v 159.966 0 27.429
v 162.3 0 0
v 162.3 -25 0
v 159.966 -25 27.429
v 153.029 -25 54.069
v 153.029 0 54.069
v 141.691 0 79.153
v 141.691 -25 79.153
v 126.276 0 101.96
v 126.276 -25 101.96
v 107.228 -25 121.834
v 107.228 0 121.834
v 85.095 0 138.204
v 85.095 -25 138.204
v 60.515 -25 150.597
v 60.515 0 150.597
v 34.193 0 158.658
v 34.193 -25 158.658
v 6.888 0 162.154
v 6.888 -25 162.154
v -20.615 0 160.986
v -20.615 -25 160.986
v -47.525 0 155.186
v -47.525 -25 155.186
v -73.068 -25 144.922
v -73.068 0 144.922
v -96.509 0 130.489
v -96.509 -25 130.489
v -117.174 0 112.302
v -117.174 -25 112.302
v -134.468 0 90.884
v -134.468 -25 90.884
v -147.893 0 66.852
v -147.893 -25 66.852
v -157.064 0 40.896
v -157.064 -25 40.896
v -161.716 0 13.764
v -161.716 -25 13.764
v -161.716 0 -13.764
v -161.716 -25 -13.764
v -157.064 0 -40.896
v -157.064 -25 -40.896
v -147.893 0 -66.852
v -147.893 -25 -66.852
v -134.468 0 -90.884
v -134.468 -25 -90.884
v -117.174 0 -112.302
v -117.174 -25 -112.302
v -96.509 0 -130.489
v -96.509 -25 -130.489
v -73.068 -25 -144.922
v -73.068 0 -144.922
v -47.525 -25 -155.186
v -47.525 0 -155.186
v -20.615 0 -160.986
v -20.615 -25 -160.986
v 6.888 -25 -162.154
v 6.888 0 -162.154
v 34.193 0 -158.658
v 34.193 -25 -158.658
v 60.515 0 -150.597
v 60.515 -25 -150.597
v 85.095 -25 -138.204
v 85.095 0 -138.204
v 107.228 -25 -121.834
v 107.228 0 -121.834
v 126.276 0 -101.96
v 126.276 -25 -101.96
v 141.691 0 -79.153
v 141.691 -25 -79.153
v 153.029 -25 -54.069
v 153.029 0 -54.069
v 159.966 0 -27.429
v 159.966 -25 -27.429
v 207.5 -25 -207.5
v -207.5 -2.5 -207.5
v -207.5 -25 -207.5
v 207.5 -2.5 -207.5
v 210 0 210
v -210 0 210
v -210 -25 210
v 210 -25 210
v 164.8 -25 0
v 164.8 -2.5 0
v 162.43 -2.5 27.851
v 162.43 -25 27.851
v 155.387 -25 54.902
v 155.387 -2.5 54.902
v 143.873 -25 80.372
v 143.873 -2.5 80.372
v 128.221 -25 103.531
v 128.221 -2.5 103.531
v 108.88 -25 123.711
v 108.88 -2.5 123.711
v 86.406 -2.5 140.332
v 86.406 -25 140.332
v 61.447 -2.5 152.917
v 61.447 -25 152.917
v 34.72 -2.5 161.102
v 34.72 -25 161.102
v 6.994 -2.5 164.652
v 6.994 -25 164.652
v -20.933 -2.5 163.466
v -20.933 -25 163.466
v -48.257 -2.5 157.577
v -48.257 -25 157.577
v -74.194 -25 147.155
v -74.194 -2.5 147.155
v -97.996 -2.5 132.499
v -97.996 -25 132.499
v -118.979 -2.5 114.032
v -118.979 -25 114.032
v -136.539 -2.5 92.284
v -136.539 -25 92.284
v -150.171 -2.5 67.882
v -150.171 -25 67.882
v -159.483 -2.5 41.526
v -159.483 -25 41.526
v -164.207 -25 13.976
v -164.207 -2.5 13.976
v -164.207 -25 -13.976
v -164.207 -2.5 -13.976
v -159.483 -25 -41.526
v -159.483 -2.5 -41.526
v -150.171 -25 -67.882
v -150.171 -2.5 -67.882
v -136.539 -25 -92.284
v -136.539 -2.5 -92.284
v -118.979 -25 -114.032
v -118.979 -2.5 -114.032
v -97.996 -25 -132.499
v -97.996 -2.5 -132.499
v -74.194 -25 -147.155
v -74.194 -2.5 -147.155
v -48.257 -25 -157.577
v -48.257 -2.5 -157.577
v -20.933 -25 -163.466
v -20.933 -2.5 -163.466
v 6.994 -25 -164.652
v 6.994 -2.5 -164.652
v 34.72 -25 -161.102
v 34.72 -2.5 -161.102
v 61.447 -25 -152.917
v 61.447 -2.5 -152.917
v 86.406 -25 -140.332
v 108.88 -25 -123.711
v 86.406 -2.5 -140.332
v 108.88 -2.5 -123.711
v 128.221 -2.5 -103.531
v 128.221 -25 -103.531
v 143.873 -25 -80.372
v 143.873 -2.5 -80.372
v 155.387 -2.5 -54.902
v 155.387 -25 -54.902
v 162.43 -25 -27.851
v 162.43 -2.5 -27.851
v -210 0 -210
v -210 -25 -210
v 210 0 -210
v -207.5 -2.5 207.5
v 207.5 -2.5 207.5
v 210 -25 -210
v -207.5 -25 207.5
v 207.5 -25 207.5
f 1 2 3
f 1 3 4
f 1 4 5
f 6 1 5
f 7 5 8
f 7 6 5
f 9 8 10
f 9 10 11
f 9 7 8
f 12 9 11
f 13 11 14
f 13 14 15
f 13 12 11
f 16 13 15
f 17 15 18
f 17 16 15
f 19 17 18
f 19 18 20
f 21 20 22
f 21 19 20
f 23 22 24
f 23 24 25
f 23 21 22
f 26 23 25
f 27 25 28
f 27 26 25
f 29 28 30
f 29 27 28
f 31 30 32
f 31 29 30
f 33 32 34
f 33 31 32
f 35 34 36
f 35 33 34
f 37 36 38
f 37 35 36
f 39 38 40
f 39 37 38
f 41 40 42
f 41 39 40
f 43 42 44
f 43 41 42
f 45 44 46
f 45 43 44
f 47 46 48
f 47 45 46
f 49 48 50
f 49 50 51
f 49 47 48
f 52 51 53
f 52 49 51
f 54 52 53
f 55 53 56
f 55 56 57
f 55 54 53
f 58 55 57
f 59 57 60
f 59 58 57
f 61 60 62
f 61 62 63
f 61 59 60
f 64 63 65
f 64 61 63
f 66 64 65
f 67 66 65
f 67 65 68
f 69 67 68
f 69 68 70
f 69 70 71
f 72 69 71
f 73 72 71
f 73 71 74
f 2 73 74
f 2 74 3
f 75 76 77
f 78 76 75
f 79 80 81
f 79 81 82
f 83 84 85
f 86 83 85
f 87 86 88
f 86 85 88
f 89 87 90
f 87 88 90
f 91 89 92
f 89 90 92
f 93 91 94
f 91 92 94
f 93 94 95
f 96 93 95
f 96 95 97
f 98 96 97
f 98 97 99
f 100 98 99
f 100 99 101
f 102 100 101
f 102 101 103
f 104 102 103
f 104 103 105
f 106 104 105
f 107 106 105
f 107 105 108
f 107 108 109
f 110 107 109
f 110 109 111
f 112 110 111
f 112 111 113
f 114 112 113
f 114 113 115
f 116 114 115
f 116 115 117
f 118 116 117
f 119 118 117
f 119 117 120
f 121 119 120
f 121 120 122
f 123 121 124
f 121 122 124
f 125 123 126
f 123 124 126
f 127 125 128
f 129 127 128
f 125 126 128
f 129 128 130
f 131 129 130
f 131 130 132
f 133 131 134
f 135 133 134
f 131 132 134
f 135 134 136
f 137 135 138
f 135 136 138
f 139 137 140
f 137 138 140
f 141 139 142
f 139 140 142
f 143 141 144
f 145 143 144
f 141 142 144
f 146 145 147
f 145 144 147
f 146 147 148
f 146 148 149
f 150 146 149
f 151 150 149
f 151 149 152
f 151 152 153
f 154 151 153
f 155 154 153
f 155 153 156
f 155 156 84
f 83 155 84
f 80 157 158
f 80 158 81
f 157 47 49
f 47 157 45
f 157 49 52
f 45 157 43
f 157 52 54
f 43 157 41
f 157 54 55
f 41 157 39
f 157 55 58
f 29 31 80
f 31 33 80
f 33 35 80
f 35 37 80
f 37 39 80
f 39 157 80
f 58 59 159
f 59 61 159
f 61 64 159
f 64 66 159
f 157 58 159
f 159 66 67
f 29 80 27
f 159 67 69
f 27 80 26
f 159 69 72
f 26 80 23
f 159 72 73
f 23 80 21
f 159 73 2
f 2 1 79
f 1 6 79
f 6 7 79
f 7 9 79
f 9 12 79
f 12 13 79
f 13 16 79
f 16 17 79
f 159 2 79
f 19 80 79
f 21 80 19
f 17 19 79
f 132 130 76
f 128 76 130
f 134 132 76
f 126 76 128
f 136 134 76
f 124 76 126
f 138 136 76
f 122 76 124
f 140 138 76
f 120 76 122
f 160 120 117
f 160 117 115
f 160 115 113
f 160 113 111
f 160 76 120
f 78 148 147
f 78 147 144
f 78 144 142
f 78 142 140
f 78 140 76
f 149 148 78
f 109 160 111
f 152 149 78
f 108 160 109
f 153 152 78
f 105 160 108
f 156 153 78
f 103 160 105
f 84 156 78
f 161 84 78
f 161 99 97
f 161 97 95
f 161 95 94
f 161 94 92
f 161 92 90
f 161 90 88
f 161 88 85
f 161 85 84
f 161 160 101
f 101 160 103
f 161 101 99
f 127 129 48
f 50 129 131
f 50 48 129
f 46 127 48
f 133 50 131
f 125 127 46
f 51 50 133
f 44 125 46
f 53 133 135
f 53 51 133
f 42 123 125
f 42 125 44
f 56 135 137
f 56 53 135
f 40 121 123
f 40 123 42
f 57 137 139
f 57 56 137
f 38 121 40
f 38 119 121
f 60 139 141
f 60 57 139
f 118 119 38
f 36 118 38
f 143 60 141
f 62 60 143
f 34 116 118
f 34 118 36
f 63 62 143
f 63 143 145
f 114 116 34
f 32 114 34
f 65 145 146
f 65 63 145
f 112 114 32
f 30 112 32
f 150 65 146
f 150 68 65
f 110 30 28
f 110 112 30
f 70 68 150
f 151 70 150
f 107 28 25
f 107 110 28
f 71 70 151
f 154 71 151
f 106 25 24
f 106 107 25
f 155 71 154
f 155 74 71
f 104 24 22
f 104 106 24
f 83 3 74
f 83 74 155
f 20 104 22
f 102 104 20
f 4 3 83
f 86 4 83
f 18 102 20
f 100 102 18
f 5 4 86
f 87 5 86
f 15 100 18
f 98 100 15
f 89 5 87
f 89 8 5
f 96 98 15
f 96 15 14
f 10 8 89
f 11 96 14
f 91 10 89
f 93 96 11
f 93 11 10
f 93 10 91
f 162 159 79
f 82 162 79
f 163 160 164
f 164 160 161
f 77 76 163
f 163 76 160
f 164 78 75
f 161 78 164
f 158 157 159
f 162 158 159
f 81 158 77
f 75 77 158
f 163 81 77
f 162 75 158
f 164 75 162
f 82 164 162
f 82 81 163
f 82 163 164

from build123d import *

# Parameters (mm, degrees)
F0_W     = 420
F0_H     = 420
F0_R     = 162.300497
F1_DEPTH = 25
F2_DEPTH = 25
F3_T     = -2.5


with BuildPart() as f1:
    # F0 (on Front) → F1 (new body)
    with BuildSketch(Plane.XZ):
        Rectangle(F0_W, F0_H)
        Circle(F0_R, mode=Mode.SUBTRACT)
    extrude(amount=F1_DEPTH)

    # F0 (on Front) → F2 (join)
    with BuildSketch(Plane.XZ):
        Rectangle(F0_W, F0_H)
        Circle(F0_R, mode=Mode.SUBTRACT)
    extrude(amount=F2_DEPTH)

    # F3
    f3_openings = [f1.faces().sort_by_distance(p)[0] for p in [
        (-204.060303, -25, 0),
    ]]
    offset(amount=F3_T, openings=f3_openings)


solid = f1.part
